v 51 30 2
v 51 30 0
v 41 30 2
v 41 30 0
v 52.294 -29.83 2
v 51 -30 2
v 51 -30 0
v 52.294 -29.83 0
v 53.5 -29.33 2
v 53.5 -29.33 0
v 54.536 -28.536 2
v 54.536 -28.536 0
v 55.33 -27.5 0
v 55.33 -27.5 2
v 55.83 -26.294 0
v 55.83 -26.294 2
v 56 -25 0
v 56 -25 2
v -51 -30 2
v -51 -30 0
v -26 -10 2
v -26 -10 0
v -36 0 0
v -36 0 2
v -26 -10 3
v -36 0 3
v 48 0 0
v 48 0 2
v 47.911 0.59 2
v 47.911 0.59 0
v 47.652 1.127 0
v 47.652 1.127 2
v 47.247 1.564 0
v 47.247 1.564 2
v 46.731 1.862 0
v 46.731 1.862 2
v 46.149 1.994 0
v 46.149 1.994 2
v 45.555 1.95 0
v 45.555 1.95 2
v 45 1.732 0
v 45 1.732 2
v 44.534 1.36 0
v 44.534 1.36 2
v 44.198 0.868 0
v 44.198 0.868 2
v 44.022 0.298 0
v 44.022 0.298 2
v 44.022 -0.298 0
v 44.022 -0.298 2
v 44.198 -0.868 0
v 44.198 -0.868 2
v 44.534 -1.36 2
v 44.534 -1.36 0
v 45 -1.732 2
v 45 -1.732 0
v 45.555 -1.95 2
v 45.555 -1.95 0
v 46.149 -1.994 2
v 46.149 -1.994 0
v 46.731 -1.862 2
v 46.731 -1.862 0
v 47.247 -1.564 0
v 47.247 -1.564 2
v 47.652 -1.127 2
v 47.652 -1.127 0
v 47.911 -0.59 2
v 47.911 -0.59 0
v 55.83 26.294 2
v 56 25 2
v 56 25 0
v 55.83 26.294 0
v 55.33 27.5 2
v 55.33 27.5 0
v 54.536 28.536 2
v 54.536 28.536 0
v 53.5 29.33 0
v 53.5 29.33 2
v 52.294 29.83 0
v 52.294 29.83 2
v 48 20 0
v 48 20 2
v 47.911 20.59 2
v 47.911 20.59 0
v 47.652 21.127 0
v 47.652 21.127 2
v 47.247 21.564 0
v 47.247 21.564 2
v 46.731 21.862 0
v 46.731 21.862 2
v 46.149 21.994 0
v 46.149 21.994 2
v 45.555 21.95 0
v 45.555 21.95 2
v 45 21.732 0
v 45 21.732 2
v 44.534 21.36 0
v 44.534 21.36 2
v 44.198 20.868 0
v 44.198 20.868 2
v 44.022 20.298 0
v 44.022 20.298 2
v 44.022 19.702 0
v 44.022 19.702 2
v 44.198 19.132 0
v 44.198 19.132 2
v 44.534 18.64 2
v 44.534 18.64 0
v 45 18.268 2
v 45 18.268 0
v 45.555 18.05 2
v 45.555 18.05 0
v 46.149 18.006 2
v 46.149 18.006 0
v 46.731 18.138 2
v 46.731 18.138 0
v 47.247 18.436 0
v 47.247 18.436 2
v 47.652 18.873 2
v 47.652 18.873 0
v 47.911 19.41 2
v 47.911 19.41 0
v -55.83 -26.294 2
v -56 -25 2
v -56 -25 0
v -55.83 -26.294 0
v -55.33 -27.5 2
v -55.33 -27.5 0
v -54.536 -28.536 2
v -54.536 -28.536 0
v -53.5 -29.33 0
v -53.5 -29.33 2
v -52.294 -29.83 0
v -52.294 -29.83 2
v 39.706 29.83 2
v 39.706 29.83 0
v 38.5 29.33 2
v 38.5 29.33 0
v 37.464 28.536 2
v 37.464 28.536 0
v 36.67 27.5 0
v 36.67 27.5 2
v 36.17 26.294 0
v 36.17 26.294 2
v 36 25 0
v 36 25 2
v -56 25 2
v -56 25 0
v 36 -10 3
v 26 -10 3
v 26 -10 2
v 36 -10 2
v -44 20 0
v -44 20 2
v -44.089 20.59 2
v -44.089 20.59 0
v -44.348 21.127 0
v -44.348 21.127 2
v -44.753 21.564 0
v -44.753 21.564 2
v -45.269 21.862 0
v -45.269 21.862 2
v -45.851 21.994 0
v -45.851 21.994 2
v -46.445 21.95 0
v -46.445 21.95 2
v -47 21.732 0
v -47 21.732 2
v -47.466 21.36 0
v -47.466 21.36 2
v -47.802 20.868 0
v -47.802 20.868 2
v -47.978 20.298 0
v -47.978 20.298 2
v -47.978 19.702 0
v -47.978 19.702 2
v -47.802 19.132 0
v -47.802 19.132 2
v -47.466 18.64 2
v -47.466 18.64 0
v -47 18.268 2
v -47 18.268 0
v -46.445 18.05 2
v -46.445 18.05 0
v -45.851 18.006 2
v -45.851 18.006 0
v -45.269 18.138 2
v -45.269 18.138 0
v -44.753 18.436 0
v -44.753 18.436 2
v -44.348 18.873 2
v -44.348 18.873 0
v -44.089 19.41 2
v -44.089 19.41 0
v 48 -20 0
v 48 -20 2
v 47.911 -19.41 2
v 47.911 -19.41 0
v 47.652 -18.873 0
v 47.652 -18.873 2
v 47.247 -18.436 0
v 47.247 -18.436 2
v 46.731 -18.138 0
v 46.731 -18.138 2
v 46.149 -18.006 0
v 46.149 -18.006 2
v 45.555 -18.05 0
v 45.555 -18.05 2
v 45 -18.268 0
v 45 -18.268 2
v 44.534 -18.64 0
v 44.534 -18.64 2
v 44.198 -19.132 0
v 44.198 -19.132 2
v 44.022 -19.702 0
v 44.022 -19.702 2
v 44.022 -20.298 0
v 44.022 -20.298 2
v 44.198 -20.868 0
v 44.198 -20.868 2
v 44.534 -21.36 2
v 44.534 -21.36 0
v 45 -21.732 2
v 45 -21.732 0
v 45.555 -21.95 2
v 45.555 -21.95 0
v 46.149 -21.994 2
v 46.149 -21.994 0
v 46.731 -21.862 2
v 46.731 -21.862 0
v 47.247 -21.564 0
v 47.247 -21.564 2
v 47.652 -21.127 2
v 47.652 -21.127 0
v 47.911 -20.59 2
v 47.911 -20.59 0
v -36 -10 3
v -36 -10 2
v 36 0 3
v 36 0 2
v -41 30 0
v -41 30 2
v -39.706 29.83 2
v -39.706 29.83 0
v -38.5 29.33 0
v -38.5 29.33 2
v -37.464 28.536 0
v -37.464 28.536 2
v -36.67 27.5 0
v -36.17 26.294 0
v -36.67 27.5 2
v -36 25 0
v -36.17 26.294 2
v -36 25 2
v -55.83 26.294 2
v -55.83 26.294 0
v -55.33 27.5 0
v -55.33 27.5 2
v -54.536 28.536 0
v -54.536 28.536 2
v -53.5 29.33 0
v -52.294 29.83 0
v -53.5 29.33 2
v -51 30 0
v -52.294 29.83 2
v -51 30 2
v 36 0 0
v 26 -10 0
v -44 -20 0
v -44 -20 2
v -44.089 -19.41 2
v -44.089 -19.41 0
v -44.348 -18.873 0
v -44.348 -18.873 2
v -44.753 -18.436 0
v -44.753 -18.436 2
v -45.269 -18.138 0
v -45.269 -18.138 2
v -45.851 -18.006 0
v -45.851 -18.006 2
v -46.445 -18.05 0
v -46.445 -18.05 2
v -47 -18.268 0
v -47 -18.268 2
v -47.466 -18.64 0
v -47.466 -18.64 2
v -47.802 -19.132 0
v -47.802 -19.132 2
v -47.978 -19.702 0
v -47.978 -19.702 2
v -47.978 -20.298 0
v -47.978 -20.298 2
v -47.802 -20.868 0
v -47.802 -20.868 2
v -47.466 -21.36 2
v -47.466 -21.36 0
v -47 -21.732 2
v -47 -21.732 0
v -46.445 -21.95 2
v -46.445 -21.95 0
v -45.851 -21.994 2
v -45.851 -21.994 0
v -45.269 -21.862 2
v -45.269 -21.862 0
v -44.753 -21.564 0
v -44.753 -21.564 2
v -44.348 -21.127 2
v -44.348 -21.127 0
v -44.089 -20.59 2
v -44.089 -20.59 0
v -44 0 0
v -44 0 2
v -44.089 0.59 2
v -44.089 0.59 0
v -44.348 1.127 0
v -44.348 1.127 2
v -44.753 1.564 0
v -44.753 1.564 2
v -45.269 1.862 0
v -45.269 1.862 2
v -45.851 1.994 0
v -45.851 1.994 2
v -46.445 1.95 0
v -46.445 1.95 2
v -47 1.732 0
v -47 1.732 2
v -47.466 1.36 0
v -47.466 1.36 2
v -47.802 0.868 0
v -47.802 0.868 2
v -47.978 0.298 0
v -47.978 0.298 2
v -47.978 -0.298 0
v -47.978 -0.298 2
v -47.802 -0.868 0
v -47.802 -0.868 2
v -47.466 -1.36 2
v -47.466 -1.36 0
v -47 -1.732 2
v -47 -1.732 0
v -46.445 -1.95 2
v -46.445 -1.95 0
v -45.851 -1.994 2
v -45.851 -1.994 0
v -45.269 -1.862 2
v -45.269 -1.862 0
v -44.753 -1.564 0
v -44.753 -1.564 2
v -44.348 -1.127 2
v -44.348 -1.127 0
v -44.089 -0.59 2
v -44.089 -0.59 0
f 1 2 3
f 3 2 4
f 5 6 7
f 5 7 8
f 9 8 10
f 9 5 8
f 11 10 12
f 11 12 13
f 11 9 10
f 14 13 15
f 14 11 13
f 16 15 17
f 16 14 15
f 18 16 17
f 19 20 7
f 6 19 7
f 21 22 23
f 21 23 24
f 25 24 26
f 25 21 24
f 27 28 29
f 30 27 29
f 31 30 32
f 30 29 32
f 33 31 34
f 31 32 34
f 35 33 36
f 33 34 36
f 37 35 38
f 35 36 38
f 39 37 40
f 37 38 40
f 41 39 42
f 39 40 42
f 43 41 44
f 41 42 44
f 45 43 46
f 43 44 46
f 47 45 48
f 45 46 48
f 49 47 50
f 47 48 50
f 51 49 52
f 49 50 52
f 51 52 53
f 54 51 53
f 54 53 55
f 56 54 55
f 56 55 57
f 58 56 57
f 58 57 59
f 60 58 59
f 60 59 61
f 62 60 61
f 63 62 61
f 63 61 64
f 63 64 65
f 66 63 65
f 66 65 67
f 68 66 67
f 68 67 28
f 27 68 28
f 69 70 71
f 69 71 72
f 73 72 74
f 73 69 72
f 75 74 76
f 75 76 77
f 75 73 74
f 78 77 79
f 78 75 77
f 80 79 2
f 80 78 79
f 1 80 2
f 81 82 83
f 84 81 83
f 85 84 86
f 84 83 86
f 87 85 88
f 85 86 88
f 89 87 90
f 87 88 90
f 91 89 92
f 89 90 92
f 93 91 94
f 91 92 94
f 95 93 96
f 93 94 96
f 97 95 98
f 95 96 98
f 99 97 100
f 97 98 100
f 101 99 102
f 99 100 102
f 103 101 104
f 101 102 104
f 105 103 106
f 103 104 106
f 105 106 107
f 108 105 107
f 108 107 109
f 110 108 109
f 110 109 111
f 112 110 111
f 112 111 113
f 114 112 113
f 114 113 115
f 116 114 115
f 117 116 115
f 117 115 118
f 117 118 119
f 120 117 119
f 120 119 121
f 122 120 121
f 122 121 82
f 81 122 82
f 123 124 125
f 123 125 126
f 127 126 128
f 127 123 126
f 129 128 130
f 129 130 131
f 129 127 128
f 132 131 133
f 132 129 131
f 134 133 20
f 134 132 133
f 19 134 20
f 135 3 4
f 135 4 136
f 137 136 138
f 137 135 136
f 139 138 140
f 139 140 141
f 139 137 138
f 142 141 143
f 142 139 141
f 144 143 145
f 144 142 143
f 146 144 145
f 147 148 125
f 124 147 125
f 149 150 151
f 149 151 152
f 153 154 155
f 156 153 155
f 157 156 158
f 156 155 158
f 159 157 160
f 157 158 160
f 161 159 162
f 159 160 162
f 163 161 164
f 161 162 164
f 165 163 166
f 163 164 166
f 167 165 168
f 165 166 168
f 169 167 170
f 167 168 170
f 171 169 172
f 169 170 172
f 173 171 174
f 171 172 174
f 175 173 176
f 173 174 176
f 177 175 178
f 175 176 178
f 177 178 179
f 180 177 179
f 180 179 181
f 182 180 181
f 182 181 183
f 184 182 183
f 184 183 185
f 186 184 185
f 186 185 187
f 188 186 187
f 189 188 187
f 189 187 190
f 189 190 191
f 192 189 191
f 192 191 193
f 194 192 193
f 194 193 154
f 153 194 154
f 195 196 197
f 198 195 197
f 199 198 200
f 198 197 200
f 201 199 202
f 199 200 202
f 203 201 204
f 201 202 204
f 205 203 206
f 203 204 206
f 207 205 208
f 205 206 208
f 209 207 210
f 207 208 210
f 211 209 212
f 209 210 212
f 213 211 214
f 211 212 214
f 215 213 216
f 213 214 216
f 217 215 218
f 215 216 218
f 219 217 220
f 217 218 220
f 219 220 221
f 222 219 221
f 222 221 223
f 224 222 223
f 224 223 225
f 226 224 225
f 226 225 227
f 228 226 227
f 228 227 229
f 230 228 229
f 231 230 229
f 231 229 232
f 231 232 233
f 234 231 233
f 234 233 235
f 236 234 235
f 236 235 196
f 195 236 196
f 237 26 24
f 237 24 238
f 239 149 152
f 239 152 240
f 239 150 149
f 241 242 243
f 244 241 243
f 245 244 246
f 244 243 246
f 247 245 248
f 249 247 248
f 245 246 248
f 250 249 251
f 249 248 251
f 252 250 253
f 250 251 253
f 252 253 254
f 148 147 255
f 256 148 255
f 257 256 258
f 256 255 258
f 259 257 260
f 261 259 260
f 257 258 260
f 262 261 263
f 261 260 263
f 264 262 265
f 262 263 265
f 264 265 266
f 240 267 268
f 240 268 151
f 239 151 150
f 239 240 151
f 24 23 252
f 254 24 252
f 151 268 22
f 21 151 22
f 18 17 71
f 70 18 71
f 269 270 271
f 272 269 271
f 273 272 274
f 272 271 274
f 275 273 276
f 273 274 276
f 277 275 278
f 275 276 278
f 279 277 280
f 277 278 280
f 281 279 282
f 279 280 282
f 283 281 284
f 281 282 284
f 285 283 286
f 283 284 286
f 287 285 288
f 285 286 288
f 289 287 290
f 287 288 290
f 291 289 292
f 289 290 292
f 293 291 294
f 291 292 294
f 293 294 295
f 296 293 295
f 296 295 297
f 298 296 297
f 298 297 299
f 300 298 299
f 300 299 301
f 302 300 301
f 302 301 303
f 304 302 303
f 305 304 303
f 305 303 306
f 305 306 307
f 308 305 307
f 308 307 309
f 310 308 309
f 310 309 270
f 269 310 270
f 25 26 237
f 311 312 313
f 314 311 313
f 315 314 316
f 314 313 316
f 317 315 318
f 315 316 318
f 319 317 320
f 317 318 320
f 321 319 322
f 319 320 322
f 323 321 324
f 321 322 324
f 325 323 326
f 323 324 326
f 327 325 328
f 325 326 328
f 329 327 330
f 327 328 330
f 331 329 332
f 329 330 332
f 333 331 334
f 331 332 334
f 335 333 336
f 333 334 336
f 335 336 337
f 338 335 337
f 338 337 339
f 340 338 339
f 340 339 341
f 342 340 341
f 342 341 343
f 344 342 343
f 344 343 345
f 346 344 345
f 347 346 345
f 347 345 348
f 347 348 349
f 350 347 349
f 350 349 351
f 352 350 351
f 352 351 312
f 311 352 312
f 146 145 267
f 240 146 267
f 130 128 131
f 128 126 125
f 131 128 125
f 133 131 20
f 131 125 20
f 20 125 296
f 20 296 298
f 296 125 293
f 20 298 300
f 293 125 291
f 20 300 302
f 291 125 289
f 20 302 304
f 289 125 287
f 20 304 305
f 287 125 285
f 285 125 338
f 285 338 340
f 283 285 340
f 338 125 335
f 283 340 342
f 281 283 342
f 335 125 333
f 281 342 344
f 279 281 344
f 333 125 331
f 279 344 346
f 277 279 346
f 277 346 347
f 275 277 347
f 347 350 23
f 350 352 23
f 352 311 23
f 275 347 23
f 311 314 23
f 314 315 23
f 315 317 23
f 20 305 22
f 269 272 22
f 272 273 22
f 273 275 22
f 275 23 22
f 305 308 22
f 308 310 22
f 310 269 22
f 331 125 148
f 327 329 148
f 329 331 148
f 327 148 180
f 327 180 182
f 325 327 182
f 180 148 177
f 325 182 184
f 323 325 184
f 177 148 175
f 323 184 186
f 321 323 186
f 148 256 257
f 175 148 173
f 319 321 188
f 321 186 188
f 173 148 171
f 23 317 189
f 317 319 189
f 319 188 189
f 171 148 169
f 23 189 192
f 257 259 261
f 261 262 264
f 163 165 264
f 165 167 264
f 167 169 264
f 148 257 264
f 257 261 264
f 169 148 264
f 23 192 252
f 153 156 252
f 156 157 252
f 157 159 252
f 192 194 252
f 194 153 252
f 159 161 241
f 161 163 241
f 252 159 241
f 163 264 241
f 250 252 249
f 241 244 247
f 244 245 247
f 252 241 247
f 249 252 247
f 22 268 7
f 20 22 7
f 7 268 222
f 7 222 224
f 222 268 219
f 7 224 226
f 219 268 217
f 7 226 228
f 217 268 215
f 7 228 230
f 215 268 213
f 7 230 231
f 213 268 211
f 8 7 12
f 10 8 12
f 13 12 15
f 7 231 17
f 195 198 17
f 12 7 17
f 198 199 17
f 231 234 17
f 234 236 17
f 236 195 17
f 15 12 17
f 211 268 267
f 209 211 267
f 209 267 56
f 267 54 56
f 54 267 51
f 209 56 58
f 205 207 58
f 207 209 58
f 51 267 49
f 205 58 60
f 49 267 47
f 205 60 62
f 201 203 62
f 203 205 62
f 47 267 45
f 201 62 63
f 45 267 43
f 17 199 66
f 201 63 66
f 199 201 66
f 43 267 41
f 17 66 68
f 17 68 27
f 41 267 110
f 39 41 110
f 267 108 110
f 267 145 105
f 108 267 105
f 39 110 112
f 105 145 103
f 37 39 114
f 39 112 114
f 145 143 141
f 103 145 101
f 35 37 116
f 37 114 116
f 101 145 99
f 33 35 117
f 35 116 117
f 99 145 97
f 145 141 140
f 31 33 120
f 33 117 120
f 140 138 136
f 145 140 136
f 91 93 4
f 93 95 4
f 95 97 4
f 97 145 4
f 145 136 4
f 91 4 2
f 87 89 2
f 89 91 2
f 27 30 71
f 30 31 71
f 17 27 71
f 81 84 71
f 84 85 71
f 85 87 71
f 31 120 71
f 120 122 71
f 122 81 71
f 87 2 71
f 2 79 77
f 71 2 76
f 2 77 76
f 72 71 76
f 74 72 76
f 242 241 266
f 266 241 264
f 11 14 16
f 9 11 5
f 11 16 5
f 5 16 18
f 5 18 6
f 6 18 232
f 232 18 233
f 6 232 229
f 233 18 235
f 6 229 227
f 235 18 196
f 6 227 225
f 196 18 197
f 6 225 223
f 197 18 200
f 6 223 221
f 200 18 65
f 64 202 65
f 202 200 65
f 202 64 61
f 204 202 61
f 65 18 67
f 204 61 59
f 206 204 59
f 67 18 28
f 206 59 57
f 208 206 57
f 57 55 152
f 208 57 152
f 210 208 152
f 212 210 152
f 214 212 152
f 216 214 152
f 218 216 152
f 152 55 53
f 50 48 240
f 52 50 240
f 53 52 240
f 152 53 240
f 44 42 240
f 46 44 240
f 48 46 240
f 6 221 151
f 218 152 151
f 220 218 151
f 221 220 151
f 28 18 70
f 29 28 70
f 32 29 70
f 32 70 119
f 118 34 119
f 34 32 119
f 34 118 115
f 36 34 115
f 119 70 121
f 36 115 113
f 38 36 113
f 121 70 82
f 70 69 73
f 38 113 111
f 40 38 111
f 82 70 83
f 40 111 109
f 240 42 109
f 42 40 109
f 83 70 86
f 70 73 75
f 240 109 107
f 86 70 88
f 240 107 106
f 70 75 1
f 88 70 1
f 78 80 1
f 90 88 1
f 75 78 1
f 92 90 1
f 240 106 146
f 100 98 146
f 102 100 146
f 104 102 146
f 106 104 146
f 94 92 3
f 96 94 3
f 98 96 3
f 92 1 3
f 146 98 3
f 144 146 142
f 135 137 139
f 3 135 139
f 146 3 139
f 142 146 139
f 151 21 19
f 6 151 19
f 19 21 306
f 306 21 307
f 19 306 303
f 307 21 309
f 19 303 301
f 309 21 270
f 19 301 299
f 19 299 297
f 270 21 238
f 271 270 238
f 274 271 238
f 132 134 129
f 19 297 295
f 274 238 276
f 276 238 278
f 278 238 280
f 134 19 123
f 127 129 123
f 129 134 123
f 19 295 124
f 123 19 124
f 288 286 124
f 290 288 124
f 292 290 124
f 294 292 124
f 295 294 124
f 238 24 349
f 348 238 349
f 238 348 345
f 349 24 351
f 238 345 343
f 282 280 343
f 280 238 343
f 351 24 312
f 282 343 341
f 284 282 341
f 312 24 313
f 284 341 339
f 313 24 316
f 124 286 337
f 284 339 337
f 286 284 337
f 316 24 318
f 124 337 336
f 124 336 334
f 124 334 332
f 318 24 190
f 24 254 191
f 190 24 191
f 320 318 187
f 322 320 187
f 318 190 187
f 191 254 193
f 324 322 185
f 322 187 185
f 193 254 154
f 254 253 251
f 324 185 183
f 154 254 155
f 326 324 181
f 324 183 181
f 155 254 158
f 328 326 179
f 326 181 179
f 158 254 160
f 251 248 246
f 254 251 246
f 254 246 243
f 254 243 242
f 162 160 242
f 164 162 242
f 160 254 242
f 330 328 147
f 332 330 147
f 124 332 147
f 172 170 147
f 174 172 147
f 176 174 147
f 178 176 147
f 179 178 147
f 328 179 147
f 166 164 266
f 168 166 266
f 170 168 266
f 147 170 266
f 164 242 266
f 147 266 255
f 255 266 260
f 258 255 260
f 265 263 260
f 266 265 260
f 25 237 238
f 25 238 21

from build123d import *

# Parameters (mm, degrees)
EXTRUDE_1_DEPTH     = 3
SKETCH_3_R          = 2
CUT_EXTRUDE_2_DEPTH = 10
FILLET_2_R          = 5
CHAMFER_1_SIZE      = 10
CUT_EXTRUDE_3_DEPTH = 1


with BuildPart() as part:
    # ｽｹｯﾁ1 → ﾎﾞｽ - 押し出し1 (new body)
    with BuildSketch(Plane.XY):
        Polygon((-56, 30), (-56, -30), (56, -30), (56, 30), (36, 30), (36, -10), (-36, -10), (-36, 30), align=None)
    extrude(amount=EXTRUDE_1_DEPTH)

    # ｽｹｯﾁ3 → ｶｯﾄ - 押し出し2 (cut)
    with BuildSketch(Plane.XY.offset(3)):
        with Locations((-46, -20)):
            Circle(SKETCH_3_R)
        with Locations((46, -20)):
            Circle(SKETCH_3_R)
        with Locations((46, 0)):
            Circle(SKETCH_3_R)
        with Locations((-46, 0)):
            Circle(SKETCH_3_R)
        with Locations((-46, 20)):
            Circle(SKETCH_3_R)
        with Locations((46, 20)):
            Circle(SKETCH_3_R)
    extrude(amount=-CUT_EXTRUDE_2_DEPTH, mode=Mode.SUBTRACT)

    # ﾌｨﾚｯﾄ2
    fillet_2_edges = [part.edges().sort_by_distance(p)[0] for p in [
        (36, 30, 1.5),
        (56, 30, 1.5),
        (56, -30, 1.5),
        (-56, -30, 1.5),
        (-56, 30, 1.5),
        (-36, 30, 1.5),
    ]]
    fillet(fillet_2_edges, radius=FILLET_2_R)

    # 面取り1
    chamfer_1_edges = [part.edges().sort_by_distance(p)[0] for p in [
        (36, -10, 1.5),
        (-36, -10, 1.5),
    ]]
    chamfer(chamfer_1_edges, length=CHAMFER_1_SIZE)

    # ｽｹｯﾁ4 → ｶｯﾄ - 押し出し3 (cut)
    with BuildSketch(Plane.XY.offset(3)):
        with BuildLine():
            Line((-36, 0), (-36, -10))
            Line((-36, -10), (-26, -10))
            Line((-26, -10), (26, -10))
            Line((26, -10), (36, -10))
            Line((36, -10), (36, 0))
            Line((36, 0), (36, 25))
            ThreePointArc((36, 25), (37.464466094, 28.535533906), (41, 30))
            Line((41, 30), (51, 30))
            ThreePointArc((51, 30), (54.535533906, 28.535533906), (56, 25))
            Line((56, 25), (56, -25))
            ThreePointArc((56, -25), (54.535533906, -28.535533906), (51, -30))
            Line((51, -30), (-51, -30))
            ThreePointArc((-51, -30), (-54.535533906, -28.535533906), (-56, -25))
            Line((-56, -25), (-56, 25))
            ThreePointArc((-56, 25), (-54.535533906, 28.535533906), (-51, 30))
            Line((-51, 30), (-41, 30))
            ThreePointArc((-41, 30), (-37.464466094, 28.535533906), (-36, 25))
            Line((-36, 25), (-36, 0))
        make_face()
    extrude(amount=-CUT_EXTRUDE_3_DEPTH, mode=Mode.SUBTRACT)


solid = part.part
